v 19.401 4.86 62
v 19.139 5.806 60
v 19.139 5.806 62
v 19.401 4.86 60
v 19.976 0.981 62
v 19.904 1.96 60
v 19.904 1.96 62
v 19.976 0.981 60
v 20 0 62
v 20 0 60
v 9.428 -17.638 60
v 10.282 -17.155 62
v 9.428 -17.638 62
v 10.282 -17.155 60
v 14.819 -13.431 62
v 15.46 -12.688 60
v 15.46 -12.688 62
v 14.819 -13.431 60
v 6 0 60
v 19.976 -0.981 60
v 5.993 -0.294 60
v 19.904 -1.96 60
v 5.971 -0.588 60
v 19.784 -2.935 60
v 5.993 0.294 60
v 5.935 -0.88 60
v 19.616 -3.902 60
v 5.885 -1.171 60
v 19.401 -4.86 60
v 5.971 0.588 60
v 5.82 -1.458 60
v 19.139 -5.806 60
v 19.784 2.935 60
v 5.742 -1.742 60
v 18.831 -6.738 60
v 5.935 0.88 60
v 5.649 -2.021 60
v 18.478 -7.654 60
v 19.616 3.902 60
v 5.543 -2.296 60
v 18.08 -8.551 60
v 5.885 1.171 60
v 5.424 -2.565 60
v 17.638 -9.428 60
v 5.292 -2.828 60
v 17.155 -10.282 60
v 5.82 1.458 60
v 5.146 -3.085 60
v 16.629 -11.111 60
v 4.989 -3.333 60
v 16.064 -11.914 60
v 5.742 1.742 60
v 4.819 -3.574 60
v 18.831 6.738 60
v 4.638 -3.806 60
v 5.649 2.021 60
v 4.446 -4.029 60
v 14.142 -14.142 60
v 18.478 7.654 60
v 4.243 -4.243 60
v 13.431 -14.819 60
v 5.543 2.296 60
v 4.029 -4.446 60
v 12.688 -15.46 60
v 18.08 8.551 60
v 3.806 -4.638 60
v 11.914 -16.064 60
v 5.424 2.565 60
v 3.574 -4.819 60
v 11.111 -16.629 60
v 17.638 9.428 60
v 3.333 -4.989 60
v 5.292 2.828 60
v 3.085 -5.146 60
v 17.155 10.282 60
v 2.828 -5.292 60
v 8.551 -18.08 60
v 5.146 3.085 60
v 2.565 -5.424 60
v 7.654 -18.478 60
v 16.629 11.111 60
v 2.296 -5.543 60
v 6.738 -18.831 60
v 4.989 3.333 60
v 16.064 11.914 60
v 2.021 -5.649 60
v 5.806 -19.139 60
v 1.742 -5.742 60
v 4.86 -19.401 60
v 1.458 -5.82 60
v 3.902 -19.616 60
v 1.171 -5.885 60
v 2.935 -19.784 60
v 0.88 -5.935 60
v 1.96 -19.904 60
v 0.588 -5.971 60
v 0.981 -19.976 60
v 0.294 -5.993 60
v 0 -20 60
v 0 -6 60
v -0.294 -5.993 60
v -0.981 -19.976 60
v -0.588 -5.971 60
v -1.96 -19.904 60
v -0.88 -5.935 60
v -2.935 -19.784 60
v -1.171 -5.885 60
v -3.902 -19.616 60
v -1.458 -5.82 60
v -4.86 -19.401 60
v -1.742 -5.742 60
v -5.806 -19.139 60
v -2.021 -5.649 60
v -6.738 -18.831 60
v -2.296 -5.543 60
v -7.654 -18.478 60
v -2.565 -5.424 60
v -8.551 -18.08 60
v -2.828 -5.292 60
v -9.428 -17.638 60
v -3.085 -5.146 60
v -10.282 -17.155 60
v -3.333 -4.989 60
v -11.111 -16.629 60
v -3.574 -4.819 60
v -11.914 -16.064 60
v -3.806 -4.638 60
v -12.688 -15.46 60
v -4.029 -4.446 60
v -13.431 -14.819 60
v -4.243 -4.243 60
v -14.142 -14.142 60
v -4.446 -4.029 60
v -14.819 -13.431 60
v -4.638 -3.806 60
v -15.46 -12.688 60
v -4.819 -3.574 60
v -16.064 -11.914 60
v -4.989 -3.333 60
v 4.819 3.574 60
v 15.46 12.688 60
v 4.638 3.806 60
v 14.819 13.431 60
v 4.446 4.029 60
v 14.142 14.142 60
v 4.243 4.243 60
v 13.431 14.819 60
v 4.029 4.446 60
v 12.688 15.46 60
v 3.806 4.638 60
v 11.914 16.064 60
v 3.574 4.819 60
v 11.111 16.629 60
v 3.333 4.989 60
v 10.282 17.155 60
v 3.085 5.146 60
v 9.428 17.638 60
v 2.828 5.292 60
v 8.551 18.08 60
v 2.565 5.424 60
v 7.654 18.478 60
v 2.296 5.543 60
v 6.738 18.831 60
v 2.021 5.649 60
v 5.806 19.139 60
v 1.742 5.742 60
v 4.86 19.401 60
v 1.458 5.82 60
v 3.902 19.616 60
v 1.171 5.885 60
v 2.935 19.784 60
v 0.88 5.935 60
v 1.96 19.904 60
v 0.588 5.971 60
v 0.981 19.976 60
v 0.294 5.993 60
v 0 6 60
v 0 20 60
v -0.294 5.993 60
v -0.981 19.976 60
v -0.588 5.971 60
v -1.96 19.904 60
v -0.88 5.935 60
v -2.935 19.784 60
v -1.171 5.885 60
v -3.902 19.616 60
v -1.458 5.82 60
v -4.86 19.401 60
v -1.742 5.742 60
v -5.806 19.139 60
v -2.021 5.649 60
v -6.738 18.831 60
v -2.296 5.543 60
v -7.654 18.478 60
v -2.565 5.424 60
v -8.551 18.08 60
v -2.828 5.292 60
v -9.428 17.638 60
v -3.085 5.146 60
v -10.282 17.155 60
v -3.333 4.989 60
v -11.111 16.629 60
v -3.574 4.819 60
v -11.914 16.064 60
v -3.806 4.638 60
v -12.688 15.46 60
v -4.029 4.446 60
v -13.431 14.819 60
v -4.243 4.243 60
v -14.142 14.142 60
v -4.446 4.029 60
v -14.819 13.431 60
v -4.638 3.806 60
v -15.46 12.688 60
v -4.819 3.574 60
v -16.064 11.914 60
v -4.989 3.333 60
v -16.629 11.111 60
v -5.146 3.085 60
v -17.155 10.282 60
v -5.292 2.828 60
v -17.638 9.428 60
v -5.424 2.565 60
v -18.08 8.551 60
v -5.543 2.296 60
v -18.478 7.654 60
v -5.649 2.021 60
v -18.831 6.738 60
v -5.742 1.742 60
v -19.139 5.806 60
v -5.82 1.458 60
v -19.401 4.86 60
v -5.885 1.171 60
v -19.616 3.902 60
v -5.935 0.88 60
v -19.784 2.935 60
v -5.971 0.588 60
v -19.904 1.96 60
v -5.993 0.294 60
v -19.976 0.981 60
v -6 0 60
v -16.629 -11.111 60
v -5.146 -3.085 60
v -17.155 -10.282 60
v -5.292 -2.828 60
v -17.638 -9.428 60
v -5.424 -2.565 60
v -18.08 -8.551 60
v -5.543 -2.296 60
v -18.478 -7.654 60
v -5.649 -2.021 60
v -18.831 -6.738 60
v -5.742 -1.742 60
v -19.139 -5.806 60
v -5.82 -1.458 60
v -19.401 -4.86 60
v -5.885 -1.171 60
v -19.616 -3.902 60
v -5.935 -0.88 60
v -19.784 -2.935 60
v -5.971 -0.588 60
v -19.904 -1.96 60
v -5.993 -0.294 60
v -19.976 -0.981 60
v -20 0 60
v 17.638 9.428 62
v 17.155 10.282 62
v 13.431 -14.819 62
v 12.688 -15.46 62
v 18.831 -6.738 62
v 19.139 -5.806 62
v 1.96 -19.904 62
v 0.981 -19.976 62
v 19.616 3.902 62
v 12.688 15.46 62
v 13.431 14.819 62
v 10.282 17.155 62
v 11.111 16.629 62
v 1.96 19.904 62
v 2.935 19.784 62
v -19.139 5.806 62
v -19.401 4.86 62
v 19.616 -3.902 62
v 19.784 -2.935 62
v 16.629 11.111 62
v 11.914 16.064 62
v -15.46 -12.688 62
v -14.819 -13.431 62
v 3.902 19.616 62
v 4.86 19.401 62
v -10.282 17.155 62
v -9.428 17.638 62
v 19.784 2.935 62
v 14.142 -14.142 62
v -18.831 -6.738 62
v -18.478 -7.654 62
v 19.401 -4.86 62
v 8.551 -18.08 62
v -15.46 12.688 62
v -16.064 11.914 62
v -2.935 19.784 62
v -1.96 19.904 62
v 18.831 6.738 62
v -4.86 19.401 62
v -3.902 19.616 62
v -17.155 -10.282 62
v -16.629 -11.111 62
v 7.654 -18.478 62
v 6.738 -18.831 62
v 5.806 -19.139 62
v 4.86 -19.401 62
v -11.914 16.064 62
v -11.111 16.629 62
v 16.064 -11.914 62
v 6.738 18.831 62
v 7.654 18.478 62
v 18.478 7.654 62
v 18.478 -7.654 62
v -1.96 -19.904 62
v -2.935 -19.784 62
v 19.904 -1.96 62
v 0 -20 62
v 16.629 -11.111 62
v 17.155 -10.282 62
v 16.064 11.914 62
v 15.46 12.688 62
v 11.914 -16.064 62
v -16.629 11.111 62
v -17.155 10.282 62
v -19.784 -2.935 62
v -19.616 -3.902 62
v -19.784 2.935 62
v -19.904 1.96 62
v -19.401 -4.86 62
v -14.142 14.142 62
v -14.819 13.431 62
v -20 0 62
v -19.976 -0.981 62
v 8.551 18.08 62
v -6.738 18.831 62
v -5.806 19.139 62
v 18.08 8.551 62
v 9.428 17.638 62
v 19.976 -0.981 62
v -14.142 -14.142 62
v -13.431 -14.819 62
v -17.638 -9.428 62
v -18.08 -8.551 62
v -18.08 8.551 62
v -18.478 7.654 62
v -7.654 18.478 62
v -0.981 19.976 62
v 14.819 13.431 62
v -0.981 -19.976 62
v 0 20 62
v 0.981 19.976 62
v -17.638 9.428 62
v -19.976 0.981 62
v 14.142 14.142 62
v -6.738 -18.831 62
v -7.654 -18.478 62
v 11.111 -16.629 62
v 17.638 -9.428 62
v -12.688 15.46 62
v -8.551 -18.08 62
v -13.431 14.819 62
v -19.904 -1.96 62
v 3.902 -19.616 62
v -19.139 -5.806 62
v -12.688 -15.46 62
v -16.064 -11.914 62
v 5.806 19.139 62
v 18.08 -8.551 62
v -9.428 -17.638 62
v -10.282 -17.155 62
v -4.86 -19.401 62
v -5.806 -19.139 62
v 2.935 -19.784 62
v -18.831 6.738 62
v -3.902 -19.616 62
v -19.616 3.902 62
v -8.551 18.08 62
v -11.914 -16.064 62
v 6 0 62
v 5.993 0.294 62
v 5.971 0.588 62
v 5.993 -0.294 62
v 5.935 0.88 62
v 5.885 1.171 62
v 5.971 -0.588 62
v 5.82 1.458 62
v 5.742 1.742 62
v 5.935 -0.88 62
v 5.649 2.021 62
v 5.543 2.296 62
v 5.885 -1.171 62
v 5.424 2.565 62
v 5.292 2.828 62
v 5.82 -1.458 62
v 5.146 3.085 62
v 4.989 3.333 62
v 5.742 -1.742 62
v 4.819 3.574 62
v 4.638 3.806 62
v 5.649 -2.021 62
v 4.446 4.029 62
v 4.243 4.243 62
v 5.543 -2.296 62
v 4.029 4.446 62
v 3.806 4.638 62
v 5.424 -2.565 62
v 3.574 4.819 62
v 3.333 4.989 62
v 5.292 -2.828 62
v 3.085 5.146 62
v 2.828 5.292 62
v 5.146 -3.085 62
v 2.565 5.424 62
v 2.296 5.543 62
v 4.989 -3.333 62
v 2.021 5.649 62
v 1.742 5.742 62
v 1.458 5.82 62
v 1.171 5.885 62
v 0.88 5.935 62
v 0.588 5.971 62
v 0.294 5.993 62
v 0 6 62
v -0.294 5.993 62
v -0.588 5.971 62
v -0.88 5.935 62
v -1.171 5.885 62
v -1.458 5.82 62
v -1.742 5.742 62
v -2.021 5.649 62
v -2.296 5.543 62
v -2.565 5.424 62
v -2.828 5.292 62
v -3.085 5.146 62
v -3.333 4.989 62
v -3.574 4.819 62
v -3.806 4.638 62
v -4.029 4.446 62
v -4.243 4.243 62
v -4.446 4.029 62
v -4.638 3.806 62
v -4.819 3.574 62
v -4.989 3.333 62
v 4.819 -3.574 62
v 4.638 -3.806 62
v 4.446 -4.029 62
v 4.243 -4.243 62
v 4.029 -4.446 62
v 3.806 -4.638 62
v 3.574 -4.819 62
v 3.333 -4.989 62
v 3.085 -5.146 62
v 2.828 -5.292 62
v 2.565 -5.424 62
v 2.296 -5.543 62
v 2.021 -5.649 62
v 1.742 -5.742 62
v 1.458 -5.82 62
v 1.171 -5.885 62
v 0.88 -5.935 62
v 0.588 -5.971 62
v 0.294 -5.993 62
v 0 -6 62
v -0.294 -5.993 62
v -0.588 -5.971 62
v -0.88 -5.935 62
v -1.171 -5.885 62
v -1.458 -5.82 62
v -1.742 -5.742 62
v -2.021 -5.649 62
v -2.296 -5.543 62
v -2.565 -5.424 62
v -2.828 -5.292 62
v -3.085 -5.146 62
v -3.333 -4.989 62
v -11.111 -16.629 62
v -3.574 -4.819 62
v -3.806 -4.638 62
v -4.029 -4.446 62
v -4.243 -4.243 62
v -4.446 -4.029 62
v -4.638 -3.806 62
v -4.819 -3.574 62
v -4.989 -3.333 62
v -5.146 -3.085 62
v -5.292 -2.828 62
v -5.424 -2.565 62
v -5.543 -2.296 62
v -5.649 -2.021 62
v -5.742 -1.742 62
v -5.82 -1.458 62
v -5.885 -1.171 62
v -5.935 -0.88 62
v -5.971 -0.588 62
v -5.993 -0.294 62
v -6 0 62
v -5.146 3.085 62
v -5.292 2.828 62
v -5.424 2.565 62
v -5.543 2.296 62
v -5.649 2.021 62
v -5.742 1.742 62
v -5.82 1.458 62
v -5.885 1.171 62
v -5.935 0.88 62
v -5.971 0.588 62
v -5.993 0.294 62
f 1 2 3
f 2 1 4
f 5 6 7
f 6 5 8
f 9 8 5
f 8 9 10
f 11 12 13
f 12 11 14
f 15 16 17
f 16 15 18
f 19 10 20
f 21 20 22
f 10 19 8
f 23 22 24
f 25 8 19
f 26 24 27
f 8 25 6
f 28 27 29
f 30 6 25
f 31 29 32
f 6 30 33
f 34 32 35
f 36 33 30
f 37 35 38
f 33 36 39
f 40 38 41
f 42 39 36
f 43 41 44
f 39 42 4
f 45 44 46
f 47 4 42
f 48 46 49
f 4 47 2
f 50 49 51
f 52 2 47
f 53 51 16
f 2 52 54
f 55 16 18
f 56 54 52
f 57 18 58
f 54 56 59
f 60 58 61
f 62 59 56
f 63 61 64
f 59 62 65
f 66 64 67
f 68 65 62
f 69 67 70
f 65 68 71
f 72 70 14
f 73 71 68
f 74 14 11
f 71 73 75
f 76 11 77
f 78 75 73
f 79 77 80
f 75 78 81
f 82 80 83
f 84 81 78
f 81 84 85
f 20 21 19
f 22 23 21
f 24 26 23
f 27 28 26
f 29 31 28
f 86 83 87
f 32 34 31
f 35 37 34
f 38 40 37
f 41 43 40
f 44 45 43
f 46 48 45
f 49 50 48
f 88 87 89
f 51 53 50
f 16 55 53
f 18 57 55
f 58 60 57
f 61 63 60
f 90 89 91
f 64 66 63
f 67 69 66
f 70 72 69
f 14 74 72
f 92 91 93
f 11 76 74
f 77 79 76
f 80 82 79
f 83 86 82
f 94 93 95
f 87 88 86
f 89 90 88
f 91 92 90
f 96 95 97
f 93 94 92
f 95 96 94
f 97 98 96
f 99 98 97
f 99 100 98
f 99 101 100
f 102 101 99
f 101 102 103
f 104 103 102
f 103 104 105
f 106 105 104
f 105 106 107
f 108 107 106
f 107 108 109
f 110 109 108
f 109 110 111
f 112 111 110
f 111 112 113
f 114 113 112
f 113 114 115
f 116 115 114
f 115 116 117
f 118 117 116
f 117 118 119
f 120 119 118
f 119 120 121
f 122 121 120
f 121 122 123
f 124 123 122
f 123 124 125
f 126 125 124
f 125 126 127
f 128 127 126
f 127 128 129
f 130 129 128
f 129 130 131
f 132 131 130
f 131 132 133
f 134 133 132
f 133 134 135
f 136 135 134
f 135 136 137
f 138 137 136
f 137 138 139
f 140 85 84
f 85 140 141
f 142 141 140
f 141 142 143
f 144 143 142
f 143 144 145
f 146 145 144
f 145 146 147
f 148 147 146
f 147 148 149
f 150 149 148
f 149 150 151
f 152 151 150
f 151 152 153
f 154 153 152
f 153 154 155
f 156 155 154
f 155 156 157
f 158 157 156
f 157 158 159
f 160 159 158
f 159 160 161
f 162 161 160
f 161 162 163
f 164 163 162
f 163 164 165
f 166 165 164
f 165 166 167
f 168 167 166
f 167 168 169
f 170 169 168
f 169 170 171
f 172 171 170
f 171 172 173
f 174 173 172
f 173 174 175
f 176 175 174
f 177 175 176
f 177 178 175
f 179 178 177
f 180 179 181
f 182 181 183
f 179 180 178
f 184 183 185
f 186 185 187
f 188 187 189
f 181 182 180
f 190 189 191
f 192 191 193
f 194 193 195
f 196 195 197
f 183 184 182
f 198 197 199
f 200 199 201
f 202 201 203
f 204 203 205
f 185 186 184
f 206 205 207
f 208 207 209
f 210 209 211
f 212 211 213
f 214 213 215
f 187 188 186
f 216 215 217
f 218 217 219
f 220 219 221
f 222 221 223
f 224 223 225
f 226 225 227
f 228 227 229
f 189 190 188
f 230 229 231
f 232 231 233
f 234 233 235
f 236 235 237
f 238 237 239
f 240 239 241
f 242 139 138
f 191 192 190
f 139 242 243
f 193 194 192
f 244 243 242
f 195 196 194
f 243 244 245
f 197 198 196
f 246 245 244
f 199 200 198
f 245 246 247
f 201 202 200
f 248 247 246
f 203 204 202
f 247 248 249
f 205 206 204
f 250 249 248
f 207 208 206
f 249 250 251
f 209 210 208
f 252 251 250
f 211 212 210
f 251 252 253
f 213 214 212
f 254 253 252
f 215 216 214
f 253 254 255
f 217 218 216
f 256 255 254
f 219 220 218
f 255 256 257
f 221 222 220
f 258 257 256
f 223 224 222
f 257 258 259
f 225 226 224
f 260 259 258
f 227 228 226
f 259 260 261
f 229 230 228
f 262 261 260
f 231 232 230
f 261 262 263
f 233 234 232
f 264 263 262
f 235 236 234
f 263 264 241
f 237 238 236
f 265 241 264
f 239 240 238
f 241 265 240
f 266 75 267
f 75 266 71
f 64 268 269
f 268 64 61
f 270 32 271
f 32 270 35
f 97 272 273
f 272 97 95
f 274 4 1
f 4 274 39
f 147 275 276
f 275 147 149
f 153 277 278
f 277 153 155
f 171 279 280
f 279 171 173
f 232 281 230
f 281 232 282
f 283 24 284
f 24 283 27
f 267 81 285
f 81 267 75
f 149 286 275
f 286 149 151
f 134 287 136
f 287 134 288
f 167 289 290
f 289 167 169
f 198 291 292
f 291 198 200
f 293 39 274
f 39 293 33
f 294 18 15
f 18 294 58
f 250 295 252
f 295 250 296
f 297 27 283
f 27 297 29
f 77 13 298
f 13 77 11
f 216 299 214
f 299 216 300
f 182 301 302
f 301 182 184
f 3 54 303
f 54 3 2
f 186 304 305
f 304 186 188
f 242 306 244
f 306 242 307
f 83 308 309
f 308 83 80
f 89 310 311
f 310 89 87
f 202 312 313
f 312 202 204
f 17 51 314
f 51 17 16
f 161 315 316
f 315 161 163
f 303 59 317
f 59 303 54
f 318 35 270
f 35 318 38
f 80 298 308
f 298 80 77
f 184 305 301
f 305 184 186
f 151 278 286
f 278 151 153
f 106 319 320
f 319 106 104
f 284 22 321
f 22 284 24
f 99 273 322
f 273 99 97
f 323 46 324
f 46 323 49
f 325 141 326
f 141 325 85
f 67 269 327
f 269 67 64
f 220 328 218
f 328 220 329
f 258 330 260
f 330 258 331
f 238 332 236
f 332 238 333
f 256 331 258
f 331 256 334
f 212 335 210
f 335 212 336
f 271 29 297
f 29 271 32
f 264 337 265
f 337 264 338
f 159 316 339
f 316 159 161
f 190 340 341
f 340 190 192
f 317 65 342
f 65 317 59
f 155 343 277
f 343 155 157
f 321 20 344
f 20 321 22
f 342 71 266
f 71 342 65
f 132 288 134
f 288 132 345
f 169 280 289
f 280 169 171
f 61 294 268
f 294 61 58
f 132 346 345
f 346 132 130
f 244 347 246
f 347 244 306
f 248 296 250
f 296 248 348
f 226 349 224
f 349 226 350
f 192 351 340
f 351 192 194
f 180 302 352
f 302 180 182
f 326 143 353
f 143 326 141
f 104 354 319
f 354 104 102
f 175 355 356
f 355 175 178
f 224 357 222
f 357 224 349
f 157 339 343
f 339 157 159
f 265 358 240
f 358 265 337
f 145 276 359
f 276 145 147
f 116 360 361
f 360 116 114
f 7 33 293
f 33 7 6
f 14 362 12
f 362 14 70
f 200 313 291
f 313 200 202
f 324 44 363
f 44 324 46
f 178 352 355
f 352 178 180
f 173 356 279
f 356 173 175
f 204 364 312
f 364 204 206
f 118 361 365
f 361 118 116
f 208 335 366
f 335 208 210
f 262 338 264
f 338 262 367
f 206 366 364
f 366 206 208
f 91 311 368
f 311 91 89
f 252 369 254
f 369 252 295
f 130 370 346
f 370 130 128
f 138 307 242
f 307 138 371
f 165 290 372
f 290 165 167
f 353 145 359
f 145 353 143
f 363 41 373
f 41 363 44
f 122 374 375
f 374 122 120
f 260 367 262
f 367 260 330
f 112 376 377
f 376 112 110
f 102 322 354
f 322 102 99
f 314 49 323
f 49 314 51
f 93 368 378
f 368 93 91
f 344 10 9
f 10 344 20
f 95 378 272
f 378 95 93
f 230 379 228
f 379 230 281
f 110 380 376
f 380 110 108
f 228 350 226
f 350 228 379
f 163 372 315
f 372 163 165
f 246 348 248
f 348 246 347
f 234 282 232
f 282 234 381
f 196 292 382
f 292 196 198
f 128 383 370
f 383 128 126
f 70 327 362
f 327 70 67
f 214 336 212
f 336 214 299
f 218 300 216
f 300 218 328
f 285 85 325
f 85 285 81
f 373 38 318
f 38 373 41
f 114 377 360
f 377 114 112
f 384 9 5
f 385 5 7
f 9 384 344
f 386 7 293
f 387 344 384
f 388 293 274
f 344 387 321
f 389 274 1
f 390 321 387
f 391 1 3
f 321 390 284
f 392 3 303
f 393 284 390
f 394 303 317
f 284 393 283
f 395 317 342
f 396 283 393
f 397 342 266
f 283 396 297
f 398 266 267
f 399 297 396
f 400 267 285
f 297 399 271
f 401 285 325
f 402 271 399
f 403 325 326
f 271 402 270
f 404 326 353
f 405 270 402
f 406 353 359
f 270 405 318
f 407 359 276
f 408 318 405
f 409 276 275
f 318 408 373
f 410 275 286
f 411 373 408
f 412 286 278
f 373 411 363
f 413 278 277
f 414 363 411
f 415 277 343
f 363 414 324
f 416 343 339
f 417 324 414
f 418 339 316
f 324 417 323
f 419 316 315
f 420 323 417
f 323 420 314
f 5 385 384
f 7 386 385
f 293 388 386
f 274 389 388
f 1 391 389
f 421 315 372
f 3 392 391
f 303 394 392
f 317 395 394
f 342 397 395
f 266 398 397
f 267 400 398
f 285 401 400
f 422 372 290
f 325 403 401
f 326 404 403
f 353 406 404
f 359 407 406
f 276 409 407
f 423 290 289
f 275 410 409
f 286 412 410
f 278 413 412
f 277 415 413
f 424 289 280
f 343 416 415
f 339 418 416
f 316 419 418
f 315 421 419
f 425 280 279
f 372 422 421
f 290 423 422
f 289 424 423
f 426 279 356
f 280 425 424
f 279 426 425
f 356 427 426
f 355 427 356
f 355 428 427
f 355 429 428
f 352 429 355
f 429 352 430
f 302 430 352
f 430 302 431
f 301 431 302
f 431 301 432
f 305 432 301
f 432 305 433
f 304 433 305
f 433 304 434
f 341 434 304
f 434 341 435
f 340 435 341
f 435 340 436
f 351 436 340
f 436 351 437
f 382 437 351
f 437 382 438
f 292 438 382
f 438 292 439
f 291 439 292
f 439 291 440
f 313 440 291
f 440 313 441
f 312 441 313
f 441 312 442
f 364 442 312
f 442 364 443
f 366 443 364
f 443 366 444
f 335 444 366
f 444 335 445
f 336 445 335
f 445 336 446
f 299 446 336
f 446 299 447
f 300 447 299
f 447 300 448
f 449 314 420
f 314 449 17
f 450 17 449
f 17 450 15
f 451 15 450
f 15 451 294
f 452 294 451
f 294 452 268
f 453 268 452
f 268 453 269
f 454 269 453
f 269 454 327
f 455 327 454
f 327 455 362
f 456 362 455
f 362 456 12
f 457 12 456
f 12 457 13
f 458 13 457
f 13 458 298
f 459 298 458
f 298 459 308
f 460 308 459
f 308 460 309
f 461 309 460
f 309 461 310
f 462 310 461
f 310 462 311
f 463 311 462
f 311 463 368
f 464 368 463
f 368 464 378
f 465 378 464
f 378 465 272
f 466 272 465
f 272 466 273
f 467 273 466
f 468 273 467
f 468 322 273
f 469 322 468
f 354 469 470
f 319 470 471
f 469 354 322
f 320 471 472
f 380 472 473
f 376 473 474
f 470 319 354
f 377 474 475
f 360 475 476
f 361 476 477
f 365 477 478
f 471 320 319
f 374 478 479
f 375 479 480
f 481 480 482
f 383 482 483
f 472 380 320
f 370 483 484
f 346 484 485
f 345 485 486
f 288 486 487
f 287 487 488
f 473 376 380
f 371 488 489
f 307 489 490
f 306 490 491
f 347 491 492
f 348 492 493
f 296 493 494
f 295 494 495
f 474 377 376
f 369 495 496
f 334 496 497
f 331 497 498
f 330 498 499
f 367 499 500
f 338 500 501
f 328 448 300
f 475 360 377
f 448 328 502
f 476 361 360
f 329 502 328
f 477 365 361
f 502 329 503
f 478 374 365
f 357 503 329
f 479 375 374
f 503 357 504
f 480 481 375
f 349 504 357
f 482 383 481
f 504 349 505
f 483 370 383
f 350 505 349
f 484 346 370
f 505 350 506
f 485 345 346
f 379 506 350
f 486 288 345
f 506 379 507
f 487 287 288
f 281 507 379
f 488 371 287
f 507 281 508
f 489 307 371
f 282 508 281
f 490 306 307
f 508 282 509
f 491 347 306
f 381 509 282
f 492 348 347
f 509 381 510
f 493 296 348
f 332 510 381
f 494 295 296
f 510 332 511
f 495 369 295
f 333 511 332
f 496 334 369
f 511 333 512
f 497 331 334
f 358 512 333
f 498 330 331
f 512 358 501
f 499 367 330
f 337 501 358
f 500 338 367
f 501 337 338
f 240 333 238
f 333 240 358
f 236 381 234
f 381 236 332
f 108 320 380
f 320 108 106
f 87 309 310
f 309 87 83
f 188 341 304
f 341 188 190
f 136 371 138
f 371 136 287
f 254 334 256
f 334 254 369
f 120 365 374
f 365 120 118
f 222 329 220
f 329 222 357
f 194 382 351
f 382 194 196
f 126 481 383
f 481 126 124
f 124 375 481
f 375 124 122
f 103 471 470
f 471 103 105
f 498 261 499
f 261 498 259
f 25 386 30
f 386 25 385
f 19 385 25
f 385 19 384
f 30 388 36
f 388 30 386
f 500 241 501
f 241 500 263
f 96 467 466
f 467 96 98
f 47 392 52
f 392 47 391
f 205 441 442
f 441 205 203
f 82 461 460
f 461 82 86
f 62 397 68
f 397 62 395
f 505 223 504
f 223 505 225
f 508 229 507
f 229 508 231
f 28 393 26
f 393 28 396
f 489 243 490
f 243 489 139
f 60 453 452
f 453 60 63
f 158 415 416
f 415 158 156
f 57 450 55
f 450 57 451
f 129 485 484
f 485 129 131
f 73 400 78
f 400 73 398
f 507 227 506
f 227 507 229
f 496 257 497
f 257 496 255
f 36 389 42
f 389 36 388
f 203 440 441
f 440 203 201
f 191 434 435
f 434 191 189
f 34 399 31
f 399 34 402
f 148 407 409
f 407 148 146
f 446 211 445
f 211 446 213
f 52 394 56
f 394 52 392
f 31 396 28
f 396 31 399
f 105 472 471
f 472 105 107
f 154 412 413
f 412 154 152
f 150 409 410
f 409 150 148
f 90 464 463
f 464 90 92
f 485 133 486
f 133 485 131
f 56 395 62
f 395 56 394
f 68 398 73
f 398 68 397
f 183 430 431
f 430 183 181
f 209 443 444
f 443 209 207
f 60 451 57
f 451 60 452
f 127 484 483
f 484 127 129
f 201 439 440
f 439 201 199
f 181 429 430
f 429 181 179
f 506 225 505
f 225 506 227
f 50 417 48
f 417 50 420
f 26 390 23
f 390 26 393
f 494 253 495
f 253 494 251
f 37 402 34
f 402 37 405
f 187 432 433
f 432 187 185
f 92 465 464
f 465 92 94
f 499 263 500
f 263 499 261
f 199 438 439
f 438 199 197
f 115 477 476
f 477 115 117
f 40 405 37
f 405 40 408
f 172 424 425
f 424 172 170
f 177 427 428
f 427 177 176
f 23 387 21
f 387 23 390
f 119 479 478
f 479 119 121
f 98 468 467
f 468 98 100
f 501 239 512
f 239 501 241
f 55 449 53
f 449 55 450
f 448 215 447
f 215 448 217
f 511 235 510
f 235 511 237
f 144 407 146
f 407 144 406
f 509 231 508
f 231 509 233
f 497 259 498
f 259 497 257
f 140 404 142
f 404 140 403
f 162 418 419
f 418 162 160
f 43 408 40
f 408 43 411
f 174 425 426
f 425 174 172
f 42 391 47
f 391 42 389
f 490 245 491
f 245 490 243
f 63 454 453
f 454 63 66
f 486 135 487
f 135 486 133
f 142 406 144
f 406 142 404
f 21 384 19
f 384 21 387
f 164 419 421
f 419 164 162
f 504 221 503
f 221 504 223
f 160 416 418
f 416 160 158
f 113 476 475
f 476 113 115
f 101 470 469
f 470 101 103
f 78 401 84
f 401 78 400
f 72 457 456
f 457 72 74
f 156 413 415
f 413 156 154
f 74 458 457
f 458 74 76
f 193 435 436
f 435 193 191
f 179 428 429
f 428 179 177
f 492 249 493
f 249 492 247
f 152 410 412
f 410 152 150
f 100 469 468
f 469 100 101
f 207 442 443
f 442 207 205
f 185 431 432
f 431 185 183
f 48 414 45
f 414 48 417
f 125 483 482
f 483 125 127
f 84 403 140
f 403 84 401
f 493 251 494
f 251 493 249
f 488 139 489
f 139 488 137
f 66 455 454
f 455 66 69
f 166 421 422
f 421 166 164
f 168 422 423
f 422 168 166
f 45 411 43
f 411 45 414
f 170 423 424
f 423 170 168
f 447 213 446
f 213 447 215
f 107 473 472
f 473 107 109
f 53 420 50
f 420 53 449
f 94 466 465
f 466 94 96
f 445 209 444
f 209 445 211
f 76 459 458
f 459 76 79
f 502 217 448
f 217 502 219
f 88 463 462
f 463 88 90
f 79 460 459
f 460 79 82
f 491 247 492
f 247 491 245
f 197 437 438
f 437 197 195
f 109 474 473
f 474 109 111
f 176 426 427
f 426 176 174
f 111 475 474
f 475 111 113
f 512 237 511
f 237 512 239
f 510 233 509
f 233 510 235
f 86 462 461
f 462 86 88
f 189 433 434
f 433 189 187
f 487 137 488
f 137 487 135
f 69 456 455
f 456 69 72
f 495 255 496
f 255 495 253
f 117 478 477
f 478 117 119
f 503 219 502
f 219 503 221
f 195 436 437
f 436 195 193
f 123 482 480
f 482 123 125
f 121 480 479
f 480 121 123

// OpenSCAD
// file: common_params.scad
cylinder_radius = 20.000000;
cylinder_height = 60.000000;
wall_thickness = 2.000000;

cap_thickness = 2.000000;

rod_radius = 2.000000;
rod_height = 50.000000;

ring_outer_radius = 8.000000;
ring_inner_radius = 4.000000;
ring_thickness = 3.000000;
ring_z = 40.000000;

$fn = 128;
// main file
include <common_params.scad>;

hole_radius = 6.000000;

translate([0, 0, cylinder_height])
difference() {
    cylinder(h = cap_thickness, r = cylinder_radius);
    translate([0, 0, -0.1])
        cylinder(h = cap_thickness + 0.2, r = hole_radius);
}
